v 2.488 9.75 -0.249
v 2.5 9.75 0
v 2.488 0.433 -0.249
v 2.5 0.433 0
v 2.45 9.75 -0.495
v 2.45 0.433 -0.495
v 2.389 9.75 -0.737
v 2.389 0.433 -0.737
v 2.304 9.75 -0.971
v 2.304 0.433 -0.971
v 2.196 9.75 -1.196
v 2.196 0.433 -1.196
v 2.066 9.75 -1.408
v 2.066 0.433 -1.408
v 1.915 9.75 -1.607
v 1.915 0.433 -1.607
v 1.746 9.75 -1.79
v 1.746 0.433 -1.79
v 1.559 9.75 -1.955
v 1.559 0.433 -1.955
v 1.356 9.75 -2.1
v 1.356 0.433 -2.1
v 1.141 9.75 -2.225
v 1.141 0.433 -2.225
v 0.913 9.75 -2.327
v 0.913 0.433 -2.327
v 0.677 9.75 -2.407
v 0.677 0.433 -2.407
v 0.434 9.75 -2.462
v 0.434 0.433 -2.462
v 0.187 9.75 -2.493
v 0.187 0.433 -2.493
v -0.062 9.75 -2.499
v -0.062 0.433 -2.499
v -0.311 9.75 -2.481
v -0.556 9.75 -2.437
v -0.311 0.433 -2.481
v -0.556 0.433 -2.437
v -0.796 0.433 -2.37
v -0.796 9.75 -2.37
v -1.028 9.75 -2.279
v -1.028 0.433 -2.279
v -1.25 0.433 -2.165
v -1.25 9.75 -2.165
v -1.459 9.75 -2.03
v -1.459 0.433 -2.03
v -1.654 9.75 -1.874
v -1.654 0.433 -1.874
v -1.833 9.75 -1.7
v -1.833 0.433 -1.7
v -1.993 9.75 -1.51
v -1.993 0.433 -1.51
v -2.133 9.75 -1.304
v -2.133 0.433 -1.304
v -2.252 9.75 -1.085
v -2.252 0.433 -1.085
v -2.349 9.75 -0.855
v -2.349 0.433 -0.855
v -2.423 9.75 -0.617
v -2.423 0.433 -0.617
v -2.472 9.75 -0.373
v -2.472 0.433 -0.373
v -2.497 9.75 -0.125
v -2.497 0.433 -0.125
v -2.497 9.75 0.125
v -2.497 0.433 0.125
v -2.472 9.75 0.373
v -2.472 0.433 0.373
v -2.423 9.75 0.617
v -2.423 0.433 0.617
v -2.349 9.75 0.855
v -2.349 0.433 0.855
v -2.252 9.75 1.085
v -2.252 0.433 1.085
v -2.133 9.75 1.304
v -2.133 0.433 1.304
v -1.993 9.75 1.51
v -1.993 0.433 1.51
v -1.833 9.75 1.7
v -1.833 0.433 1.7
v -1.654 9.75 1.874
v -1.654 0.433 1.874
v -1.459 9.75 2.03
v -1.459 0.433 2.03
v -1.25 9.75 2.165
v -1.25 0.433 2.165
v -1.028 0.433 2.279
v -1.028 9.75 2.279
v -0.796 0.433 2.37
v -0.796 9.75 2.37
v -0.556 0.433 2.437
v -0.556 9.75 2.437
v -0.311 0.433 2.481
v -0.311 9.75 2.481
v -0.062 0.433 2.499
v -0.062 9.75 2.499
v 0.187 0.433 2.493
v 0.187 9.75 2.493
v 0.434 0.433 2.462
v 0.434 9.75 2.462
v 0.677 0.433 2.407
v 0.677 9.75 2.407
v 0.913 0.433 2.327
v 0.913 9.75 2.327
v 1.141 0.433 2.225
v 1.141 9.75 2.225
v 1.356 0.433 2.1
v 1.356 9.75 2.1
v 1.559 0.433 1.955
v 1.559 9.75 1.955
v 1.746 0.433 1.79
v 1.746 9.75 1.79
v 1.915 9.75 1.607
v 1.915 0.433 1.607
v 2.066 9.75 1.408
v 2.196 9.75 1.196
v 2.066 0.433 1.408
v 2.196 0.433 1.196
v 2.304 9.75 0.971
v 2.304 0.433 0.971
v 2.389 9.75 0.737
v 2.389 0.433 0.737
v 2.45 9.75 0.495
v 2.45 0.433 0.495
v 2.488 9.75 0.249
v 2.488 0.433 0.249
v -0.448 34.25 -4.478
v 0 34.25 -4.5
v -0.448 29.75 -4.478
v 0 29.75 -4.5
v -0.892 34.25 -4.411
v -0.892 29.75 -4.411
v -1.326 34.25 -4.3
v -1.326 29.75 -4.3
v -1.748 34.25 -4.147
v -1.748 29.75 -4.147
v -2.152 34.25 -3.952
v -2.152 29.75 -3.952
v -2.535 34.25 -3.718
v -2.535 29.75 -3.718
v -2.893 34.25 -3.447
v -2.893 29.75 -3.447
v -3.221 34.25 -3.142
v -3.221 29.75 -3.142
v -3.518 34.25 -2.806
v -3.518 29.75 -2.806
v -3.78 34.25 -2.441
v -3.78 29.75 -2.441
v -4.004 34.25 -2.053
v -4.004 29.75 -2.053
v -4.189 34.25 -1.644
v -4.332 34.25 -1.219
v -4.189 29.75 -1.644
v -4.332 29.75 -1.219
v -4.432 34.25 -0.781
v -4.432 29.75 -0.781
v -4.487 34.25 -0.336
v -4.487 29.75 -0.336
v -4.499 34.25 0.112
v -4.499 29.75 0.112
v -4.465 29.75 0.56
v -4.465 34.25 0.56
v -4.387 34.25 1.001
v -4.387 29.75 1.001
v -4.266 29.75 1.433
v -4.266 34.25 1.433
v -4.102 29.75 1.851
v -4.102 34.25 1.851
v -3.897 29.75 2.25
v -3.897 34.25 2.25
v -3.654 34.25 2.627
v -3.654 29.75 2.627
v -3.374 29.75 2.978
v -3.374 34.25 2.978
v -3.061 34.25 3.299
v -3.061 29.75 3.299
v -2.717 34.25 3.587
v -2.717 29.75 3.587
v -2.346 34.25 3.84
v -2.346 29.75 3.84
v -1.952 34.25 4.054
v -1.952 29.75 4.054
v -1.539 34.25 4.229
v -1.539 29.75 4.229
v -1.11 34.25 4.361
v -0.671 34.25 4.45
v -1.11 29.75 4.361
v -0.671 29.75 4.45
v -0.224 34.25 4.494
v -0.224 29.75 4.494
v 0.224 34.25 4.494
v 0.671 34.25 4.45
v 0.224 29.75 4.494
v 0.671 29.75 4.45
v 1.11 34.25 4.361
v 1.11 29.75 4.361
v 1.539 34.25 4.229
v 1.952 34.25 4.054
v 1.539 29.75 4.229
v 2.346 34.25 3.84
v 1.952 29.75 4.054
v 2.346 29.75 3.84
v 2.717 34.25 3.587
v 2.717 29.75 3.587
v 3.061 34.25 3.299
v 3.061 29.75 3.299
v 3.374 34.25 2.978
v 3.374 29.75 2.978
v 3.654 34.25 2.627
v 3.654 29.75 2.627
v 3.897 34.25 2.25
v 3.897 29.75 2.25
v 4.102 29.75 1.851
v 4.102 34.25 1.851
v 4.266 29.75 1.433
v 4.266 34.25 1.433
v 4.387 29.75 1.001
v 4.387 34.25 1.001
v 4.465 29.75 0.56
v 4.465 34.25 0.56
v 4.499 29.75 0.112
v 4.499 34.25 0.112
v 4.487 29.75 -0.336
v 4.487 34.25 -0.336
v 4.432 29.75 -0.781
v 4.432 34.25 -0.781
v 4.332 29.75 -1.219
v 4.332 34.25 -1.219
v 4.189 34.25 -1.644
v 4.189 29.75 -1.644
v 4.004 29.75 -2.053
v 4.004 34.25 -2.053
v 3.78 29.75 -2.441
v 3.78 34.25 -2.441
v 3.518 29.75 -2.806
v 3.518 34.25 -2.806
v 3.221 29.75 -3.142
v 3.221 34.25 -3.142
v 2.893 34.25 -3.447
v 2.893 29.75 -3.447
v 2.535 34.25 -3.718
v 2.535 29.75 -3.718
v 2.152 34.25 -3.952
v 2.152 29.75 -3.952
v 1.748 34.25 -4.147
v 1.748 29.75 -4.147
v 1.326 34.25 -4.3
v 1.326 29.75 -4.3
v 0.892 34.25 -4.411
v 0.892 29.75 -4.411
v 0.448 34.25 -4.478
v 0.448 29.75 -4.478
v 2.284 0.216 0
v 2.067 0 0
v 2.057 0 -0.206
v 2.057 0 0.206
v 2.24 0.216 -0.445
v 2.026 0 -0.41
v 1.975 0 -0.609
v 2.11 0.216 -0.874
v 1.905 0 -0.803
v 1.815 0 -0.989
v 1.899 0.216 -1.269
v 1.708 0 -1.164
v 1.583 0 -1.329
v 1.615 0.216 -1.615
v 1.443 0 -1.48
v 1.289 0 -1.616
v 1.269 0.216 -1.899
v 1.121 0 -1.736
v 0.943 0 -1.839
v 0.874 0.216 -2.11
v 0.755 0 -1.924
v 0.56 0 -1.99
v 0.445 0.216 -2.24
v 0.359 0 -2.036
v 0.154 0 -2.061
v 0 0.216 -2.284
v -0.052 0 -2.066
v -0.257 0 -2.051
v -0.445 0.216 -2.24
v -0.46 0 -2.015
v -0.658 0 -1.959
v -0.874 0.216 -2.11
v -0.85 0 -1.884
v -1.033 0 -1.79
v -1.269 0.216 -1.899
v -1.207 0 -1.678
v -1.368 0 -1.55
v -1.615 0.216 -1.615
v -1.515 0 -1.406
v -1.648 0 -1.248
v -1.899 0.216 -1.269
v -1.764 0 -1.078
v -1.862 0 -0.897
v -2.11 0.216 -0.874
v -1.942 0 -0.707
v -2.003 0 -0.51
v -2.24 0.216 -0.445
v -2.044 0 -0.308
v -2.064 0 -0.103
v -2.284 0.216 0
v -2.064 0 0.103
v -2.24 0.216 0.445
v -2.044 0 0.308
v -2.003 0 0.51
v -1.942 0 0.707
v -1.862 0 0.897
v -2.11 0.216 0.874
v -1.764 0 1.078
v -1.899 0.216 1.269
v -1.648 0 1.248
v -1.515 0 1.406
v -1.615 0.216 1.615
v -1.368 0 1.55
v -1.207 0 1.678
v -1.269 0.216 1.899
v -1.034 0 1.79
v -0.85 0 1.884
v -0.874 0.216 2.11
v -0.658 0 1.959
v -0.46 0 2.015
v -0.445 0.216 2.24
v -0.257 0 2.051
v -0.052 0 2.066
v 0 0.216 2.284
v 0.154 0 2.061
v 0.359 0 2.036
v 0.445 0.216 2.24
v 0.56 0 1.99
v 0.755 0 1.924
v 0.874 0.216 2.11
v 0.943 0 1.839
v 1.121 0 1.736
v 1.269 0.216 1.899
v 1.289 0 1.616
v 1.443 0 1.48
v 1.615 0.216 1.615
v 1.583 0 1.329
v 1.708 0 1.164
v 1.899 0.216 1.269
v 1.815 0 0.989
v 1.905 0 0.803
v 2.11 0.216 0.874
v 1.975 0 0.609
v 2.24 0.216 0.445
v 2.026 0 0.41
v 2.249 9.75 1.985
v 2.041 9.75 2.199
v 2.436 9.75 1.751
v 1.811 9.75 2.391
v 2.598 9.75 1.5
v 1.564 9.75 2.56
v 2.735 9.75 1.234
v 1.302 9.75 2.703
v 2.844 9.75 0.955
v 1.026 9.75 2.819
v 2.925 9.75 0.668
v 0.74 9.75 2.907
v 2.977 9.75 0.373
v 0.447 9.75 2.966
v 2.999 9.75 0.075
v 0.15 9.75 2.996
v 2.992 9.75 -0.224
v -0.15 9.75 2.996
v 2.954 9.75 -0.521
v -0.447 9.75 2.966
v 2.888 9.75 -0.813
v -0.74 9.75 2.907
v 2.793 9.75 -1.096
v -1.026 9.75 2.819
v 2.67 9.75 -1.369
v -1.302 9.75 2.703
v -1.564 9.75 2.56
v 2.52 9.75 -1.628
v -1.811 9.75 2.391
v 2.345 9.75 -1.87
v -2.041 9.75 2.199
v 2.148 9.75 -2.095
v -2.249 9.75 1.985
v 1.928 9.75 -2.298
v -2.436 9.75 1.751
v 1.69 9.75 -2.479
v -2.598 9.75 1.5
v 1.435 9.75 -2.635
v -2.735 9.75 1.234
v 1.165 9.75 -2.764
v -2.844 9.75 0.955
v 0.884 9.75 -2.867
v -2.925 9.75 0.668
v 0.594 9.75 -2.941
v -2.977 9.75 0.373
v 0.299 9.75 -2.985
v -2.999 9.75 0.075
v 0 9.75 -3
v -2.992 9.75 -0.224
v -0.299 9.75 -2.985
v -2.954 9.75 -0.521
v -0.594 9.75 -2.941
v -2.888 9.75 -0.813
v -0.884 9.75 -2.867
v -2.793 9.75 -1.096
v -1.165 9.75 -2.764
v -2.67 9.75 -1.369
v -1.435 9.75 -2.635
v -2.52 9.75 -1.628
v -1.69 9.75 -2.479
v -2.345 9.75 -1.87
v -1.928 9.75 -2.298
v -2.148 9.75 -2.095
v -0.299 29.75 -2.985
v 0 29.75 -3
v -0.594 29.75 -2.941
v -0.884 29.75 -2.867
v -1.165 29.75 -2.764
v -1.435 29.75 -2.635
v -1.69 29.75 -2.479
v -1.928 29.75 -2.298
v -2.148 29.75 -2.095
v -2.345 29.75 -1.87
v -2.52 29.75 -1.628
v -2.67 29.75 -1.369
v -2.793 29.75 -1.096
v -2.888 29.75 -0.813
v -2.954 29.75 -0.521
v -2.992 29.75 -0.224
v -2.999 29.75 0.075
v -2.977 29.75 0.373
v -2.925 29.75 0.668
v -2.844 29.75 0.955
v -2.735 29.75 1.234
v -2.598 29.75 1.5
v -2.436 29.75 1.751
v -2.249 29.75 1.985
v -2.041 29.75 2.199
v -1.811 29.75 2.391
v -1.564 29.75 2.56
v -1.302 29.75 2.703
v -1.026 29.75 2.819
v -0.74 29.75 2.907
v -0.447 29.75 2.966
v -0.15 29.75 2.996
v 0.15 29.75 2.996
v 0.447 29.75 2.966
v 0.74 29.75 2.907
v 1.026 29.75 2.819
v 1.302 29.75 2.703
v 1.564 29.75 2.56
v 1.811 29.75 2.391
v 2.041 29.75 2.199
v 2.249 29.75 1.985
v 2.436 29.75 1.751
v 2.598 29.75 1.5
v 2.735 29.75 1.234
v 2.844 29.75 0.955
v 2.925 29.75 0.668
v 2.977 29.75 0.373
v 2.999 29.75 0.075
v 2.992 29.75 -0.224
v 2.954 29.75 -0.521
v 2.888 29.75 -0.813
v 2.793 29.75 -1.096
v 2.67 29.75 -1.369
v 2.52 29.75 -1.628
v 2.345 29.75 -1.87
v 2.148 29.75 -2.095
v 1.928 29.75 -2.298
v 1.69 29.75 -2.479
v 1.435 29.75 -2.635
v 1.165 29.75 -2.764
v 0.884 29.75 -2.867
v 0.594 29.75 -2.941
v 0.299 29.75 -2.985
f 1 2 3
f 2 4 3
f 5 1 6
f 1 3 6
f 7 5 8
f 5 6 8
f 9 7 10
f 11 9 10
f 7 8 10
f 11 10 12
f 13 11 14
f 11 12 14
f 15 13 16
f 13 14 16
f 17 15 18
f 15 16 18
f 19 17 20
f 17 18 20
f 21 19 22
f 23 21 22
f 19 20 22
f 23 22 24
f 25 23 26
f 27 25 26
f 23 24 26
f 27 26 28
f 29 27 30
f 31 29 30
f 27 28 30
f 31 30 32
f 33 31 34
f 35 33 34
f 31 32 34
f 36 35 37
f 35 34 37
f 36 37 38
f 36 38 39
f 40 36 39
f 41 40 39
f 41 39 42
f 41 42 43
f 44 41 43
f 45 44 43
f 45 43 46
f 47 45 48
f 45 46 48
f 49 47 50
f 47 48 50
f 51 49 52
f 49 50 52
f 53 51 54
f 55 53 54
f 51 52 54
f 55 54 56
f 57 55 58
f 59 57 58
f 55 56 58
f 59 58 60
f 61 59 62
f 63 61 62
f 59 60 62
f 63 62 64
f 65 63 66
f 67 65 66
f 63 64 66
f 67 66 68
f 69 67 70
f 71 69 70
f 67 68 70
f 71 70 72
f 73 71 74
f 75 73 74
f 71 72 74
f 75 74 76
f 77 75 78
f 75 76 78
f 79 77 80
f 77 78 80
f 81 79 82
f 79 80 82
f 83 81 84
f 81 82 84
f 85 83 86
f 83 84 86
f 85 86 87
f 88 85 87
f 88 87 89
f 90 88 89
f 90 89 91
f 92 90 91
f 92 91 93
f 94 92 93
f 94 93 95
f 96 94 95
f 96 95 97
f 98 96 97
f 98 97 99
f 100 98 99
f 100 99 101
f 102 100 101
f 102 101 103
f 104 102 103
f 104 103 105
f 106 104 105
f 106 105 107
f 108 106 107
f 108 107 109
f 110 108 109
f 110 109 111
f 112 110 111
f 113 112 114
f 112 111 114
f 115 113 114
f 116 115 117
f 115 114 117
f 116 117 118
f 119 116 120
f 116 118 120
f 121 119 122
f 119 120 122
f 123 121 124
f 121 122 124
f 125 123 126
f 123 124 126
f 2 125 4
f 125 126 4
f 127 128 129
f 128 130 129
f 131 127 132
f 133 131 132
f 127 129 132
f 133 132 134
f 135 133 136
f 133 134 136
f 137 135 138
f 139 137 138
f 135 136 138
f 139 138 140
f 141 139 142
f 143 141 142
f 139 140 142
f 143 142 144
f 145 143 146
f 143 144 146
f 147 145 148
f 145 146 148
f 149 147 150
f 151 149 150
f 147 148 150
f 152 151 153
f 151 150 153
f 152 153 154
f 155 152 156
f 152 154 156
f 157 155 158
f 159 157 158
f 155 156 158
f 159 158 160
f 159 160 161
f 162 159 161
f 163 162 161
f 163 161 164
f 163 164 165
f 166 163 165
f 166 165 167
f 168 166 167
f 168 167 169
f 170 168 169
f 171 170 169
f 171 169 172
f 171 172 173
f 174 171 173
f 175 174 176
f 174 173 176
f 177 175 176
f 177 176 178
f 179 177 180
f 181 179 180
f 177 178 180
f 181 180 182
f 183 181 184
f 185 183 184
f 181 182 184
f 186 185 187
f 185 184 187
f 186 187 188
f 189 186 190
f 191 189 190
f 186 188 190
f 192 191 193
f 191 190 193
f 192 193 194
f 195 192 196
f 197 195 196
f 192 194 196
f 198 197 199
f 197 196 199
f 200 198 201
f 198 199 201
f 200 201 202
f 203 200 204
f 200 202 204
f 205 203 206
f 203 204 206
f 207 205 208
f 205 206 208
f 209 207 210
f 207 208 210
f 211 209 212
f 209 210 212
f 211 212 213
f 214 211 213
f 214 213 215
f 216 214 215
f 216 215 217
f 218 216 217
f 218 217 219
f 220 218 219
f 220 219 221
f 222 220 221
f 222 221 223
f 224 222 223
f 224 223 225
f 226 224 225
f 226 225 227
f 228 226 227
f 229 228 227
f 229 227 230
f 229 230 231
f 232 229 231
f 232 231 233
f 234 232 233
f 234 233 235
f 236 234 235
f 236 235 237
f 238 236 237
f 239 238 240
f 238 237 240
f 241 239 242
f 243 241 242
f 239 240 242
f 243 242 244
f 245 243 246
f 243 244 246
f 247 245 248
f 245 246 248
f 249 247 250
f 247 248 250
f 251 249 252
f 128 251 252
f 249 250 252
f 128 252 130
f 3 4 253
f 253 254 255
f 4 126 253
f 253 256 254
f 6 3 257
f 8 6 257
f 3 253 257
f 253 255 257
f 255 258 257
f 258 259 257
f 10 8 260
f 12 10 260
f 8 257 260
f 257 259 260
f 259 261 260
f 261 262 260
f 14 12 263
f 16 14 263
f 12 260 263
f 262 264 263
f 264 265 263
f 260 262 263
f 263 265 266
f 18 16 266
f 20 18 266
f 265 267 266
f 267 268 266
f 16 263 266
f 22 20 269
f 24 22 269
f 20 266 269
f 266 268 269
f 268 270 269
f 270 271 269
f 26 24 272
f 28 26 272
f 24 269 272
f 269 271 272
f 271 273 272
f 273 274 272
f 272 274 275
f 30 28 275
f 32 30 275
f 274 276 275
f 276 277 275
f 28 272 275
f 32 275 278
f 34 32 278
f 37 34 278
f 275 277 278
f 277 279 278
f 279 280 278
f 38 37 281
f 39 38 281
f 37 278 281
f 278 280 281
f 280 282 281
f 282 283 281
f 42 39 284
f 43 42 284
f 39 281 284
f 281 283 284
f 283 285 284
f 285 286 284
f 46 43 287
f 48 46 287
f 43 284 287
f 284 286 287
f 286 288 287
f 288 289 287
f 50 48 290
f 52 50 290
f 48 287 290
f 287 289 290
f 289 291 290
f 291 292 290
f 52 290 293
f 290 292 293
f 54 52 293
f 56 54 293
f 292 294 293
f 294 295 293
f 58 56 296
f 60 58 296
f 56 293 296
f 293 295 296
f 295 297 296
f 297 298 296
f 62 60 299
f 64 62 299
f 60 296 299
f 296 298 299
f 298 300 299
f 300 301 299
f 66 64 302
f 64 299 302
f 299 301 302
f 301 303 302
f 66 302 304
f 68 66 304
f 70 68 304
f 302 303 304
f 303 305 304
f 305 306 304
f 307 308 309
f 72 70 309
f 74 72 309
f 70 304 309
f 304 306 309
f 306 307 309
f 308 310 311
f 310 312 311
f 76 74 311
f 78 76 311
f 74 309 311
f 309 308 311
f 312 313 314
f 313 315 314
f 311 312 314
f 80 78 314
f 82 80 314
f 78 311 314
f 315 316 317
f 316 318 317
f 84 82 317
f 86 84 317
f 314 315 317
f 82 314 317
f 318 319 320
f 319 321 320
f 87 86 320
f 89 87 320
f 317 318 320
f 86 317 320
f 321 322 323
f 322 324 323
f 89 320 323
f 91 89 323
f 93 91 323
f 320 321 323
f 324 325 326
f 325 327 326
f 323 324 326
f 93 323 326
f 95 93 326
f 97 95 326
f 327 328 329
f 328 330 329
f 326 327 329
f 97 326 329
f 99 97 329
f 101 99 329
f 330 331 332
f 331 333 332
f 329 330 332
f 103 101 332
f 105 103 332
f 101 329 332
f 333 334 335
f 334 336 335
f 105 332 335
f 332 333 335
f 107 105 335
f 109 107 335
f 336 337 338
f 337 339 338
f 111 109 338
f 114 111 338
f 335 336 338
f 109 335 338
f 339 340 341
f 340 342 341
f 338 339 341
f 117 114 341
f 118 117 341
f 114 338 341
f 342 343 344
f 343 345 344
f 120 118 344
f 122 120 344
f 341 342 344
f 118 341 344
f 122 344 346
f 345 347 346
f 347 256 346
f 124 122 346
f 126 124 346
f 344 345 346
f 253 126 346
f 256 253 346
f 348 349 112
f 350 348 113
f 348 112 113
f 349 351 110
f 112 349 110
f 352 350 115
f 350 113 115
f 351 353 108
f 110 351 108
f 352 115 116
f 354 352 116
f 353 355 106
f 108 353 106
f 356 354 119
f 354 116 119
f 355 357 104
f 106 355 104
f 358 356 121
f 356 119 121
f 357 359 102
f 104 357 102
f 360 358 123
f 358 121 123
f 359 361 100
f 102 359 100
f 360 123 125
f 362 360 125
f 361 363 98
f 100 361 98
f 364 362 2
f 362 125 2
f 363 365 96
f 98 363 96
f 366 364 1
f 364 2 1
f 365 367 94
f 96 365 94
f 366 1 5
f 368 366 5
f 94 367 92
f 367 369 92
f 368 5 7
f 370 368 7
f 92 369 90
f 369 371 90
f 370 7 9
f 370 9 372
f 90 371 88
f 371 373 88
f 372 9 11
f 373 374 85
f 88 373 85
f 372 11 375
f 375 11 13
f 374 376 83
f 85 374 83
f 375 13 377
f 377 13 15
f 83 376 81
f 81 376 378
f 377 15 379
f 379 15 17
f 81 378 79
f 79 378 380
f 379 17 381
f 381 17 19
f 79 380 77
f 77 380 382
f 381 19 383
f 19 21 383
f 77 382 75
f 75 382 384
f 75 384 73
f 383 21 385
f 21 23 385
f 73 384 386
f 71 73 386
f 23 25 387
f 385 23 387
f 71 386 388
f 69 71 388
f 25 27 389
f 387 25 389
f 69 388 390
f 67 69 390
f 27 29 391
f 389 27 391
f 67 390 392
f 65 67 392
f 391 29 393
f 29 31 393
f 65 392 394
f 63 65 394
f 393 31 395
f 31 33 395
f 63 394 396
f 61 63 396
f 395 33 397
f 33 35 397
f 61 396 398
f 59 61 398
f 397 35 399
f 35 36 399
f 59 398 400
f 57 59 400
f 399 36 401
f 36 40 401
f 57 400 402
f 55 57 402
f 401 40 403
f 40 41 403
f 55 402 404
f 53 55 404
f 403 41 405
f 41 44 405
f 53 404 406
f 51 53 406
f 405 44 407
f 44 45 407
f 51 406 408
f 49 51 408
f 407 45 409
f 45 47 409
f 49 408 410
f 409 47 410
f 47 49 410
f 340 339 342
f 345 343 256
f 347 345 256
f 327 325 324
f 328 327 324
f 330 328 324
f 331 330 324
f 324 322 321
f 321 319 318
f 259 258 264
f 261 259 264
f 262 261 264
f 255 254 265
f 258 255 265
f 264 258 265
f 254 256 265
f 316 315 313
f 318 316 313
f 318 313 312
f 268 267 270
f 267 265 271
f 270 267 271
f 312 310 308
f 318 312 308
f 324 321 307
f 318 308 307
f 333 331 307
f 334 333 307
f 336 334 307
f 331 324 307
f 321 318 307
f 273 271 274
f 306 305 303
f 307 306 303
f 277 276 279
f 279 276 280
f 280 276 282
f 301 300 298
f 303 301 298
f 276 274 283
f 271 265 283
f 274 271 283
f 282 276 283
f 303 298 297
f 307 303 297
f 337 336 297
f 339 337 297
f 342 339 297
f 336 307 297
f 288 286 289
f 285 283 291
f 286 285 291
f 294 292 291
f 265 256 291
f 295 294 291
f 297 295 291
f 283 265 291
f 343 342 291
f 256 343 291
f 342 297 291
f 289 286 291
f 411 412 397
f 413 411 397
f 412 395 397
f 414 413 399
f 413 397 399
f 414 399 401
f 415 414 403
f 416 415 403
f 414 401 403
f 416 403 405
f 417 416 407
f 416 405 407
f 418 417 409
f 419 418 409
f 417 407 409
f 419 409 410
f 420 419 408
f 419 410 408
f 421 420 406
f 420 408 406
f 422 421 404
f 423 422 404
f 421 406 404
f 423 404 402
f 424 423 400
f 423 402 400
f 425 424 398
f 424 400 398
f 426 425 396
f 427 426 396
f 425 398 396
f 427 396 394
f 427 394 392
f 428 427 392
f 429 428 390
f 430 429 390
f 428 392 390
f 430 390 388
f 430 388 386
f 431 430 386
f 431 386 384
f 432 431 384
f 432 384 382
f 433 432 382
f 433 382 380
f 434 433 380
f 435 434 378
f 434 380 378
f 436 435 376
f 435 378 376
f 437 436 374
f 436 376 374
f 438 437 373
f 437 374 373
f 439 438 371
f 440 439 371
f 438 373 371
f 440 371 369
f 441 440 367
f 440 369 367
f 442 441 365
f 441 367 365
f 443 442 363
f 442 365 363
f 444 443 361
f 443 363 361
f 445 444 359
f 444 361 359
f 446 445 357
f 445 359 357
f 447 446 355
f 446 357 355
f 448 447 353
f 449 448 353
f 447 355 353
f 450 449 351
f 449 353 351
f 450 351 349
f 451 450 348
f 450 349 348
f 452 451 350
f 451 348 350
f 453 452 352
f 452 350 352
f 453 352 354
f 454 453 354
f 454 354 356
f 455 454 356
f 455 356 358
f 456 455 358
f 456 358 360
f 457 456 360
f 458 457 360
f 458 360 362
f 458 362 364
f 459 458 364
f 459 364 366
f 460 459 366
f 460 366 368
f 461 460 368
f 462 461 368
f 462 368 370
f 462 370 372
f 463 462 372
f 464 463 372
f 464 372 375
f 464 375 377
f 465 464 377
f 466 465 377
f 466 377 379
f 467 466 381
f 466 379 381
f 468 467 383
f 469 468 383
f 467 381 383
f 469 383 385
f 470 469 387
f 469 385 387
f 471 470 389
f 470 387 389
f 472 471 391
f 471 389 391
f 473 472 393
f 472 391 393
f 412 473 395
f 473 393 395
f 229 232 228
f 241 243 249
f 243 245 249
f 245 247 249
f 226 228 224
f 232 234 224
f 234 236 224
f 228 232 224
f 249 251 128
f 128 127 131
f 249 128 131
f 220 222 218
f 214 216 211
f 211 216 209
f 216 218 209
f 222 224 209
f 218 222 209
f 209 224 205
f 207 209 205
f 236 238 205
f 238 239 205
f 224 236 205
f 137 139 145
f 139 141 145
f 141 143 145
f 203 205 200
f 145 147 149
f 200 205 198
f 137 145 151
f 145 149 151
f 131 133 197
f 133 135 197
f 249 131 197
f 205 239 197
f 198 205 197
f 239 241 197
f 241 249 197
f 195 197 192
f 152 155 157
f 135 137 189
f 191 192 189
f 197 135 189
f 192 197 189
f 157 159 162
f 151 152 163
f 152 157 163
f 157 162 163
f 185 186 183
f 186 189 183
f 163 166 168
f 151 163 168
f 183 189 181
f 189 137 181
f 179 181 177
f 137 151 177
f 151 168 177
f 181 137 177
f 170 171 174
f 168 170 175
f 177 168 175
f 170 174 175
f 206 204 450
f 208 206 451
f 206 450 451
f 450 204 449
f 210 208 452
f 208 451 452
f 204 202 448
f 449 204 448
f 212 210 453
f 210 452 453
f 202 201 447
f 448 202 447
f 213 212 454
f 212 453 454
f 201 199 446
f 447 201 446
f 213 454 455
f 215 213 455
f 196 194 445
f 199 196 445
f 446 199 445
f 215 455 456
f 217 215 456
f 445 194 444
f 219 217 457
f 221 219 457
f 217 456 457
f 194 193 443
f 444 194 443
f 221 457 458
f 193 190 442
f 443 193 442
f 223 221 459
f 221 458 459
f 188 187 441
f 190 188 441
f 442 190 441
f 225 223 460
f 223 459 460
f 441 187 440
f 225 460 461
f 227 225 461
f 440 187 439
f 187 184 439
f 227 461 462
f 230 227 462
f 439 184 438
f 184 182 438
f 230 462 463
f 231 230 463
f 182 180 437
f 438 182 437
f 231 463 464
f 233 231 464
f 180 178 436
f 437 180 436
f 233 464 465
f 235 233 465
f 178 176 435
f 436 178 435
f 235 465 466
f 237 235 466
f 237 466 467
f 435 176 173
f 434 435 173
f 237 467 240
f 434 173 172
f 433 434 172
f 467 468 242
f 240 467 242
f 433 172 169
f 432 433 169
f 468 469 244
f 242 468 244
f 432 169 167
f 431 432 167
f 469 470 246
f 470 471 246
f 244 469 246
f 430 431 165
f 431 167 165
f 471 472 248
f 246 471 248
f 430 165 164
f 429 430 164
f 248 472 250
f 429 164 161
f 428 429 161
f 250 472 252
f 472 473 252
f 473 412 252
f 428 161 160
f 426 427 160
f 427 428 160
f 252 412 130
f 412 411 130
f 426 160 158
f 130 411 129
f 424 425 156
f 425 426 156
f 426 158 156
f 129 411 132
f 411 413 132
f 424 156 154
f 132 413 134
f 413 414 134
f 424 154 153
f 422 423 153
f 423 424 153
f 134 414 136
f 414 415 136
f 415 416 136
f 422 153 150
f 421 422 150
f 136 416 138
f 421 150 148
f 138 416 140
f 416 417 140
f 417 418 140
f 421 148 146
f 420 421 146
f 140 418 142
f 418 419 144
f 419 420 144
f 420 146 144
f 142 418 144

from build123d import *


# Read off the part's stored shape, not the designer's step: M5 机械螺纹 螺柱1
with BuildPart() as part:
    # 草图1 → 旋转1 (revolve)
    with BuildSketch(Plane.XY, mode=Mode.PRIVATE) as revolve_1_sk:
        Polygon((0, 0), (0, 34.25), (4.5, 34.25), (4.5, 29.75), (3, 29.75), (3, 9.75), (2.8, 9.75), (2.8, 0), align=None)
    revolve(revolve_1_sk.sketch.rotate(Axis((0, 0, 0), (0, 1, 0)), 90), axis=Axis((0, 0, 0), (0, 1, 0)))

    # M5 机械螺纹 螺柱1 outline → M5 机械螺纹 螺柱1 (revolve, cut)
    with BuildSketch(Plane.XY):
        Polygon((2.8, 9.75), (2.5, 9.75), (2.5, 0.433), (2.067, 0), (2.8, 0), align=None)
    revolve(axis=Axis((0, 0, 0), (0, 1, 0)), mode=Mode.SUBTRACT)


solid = part.part
